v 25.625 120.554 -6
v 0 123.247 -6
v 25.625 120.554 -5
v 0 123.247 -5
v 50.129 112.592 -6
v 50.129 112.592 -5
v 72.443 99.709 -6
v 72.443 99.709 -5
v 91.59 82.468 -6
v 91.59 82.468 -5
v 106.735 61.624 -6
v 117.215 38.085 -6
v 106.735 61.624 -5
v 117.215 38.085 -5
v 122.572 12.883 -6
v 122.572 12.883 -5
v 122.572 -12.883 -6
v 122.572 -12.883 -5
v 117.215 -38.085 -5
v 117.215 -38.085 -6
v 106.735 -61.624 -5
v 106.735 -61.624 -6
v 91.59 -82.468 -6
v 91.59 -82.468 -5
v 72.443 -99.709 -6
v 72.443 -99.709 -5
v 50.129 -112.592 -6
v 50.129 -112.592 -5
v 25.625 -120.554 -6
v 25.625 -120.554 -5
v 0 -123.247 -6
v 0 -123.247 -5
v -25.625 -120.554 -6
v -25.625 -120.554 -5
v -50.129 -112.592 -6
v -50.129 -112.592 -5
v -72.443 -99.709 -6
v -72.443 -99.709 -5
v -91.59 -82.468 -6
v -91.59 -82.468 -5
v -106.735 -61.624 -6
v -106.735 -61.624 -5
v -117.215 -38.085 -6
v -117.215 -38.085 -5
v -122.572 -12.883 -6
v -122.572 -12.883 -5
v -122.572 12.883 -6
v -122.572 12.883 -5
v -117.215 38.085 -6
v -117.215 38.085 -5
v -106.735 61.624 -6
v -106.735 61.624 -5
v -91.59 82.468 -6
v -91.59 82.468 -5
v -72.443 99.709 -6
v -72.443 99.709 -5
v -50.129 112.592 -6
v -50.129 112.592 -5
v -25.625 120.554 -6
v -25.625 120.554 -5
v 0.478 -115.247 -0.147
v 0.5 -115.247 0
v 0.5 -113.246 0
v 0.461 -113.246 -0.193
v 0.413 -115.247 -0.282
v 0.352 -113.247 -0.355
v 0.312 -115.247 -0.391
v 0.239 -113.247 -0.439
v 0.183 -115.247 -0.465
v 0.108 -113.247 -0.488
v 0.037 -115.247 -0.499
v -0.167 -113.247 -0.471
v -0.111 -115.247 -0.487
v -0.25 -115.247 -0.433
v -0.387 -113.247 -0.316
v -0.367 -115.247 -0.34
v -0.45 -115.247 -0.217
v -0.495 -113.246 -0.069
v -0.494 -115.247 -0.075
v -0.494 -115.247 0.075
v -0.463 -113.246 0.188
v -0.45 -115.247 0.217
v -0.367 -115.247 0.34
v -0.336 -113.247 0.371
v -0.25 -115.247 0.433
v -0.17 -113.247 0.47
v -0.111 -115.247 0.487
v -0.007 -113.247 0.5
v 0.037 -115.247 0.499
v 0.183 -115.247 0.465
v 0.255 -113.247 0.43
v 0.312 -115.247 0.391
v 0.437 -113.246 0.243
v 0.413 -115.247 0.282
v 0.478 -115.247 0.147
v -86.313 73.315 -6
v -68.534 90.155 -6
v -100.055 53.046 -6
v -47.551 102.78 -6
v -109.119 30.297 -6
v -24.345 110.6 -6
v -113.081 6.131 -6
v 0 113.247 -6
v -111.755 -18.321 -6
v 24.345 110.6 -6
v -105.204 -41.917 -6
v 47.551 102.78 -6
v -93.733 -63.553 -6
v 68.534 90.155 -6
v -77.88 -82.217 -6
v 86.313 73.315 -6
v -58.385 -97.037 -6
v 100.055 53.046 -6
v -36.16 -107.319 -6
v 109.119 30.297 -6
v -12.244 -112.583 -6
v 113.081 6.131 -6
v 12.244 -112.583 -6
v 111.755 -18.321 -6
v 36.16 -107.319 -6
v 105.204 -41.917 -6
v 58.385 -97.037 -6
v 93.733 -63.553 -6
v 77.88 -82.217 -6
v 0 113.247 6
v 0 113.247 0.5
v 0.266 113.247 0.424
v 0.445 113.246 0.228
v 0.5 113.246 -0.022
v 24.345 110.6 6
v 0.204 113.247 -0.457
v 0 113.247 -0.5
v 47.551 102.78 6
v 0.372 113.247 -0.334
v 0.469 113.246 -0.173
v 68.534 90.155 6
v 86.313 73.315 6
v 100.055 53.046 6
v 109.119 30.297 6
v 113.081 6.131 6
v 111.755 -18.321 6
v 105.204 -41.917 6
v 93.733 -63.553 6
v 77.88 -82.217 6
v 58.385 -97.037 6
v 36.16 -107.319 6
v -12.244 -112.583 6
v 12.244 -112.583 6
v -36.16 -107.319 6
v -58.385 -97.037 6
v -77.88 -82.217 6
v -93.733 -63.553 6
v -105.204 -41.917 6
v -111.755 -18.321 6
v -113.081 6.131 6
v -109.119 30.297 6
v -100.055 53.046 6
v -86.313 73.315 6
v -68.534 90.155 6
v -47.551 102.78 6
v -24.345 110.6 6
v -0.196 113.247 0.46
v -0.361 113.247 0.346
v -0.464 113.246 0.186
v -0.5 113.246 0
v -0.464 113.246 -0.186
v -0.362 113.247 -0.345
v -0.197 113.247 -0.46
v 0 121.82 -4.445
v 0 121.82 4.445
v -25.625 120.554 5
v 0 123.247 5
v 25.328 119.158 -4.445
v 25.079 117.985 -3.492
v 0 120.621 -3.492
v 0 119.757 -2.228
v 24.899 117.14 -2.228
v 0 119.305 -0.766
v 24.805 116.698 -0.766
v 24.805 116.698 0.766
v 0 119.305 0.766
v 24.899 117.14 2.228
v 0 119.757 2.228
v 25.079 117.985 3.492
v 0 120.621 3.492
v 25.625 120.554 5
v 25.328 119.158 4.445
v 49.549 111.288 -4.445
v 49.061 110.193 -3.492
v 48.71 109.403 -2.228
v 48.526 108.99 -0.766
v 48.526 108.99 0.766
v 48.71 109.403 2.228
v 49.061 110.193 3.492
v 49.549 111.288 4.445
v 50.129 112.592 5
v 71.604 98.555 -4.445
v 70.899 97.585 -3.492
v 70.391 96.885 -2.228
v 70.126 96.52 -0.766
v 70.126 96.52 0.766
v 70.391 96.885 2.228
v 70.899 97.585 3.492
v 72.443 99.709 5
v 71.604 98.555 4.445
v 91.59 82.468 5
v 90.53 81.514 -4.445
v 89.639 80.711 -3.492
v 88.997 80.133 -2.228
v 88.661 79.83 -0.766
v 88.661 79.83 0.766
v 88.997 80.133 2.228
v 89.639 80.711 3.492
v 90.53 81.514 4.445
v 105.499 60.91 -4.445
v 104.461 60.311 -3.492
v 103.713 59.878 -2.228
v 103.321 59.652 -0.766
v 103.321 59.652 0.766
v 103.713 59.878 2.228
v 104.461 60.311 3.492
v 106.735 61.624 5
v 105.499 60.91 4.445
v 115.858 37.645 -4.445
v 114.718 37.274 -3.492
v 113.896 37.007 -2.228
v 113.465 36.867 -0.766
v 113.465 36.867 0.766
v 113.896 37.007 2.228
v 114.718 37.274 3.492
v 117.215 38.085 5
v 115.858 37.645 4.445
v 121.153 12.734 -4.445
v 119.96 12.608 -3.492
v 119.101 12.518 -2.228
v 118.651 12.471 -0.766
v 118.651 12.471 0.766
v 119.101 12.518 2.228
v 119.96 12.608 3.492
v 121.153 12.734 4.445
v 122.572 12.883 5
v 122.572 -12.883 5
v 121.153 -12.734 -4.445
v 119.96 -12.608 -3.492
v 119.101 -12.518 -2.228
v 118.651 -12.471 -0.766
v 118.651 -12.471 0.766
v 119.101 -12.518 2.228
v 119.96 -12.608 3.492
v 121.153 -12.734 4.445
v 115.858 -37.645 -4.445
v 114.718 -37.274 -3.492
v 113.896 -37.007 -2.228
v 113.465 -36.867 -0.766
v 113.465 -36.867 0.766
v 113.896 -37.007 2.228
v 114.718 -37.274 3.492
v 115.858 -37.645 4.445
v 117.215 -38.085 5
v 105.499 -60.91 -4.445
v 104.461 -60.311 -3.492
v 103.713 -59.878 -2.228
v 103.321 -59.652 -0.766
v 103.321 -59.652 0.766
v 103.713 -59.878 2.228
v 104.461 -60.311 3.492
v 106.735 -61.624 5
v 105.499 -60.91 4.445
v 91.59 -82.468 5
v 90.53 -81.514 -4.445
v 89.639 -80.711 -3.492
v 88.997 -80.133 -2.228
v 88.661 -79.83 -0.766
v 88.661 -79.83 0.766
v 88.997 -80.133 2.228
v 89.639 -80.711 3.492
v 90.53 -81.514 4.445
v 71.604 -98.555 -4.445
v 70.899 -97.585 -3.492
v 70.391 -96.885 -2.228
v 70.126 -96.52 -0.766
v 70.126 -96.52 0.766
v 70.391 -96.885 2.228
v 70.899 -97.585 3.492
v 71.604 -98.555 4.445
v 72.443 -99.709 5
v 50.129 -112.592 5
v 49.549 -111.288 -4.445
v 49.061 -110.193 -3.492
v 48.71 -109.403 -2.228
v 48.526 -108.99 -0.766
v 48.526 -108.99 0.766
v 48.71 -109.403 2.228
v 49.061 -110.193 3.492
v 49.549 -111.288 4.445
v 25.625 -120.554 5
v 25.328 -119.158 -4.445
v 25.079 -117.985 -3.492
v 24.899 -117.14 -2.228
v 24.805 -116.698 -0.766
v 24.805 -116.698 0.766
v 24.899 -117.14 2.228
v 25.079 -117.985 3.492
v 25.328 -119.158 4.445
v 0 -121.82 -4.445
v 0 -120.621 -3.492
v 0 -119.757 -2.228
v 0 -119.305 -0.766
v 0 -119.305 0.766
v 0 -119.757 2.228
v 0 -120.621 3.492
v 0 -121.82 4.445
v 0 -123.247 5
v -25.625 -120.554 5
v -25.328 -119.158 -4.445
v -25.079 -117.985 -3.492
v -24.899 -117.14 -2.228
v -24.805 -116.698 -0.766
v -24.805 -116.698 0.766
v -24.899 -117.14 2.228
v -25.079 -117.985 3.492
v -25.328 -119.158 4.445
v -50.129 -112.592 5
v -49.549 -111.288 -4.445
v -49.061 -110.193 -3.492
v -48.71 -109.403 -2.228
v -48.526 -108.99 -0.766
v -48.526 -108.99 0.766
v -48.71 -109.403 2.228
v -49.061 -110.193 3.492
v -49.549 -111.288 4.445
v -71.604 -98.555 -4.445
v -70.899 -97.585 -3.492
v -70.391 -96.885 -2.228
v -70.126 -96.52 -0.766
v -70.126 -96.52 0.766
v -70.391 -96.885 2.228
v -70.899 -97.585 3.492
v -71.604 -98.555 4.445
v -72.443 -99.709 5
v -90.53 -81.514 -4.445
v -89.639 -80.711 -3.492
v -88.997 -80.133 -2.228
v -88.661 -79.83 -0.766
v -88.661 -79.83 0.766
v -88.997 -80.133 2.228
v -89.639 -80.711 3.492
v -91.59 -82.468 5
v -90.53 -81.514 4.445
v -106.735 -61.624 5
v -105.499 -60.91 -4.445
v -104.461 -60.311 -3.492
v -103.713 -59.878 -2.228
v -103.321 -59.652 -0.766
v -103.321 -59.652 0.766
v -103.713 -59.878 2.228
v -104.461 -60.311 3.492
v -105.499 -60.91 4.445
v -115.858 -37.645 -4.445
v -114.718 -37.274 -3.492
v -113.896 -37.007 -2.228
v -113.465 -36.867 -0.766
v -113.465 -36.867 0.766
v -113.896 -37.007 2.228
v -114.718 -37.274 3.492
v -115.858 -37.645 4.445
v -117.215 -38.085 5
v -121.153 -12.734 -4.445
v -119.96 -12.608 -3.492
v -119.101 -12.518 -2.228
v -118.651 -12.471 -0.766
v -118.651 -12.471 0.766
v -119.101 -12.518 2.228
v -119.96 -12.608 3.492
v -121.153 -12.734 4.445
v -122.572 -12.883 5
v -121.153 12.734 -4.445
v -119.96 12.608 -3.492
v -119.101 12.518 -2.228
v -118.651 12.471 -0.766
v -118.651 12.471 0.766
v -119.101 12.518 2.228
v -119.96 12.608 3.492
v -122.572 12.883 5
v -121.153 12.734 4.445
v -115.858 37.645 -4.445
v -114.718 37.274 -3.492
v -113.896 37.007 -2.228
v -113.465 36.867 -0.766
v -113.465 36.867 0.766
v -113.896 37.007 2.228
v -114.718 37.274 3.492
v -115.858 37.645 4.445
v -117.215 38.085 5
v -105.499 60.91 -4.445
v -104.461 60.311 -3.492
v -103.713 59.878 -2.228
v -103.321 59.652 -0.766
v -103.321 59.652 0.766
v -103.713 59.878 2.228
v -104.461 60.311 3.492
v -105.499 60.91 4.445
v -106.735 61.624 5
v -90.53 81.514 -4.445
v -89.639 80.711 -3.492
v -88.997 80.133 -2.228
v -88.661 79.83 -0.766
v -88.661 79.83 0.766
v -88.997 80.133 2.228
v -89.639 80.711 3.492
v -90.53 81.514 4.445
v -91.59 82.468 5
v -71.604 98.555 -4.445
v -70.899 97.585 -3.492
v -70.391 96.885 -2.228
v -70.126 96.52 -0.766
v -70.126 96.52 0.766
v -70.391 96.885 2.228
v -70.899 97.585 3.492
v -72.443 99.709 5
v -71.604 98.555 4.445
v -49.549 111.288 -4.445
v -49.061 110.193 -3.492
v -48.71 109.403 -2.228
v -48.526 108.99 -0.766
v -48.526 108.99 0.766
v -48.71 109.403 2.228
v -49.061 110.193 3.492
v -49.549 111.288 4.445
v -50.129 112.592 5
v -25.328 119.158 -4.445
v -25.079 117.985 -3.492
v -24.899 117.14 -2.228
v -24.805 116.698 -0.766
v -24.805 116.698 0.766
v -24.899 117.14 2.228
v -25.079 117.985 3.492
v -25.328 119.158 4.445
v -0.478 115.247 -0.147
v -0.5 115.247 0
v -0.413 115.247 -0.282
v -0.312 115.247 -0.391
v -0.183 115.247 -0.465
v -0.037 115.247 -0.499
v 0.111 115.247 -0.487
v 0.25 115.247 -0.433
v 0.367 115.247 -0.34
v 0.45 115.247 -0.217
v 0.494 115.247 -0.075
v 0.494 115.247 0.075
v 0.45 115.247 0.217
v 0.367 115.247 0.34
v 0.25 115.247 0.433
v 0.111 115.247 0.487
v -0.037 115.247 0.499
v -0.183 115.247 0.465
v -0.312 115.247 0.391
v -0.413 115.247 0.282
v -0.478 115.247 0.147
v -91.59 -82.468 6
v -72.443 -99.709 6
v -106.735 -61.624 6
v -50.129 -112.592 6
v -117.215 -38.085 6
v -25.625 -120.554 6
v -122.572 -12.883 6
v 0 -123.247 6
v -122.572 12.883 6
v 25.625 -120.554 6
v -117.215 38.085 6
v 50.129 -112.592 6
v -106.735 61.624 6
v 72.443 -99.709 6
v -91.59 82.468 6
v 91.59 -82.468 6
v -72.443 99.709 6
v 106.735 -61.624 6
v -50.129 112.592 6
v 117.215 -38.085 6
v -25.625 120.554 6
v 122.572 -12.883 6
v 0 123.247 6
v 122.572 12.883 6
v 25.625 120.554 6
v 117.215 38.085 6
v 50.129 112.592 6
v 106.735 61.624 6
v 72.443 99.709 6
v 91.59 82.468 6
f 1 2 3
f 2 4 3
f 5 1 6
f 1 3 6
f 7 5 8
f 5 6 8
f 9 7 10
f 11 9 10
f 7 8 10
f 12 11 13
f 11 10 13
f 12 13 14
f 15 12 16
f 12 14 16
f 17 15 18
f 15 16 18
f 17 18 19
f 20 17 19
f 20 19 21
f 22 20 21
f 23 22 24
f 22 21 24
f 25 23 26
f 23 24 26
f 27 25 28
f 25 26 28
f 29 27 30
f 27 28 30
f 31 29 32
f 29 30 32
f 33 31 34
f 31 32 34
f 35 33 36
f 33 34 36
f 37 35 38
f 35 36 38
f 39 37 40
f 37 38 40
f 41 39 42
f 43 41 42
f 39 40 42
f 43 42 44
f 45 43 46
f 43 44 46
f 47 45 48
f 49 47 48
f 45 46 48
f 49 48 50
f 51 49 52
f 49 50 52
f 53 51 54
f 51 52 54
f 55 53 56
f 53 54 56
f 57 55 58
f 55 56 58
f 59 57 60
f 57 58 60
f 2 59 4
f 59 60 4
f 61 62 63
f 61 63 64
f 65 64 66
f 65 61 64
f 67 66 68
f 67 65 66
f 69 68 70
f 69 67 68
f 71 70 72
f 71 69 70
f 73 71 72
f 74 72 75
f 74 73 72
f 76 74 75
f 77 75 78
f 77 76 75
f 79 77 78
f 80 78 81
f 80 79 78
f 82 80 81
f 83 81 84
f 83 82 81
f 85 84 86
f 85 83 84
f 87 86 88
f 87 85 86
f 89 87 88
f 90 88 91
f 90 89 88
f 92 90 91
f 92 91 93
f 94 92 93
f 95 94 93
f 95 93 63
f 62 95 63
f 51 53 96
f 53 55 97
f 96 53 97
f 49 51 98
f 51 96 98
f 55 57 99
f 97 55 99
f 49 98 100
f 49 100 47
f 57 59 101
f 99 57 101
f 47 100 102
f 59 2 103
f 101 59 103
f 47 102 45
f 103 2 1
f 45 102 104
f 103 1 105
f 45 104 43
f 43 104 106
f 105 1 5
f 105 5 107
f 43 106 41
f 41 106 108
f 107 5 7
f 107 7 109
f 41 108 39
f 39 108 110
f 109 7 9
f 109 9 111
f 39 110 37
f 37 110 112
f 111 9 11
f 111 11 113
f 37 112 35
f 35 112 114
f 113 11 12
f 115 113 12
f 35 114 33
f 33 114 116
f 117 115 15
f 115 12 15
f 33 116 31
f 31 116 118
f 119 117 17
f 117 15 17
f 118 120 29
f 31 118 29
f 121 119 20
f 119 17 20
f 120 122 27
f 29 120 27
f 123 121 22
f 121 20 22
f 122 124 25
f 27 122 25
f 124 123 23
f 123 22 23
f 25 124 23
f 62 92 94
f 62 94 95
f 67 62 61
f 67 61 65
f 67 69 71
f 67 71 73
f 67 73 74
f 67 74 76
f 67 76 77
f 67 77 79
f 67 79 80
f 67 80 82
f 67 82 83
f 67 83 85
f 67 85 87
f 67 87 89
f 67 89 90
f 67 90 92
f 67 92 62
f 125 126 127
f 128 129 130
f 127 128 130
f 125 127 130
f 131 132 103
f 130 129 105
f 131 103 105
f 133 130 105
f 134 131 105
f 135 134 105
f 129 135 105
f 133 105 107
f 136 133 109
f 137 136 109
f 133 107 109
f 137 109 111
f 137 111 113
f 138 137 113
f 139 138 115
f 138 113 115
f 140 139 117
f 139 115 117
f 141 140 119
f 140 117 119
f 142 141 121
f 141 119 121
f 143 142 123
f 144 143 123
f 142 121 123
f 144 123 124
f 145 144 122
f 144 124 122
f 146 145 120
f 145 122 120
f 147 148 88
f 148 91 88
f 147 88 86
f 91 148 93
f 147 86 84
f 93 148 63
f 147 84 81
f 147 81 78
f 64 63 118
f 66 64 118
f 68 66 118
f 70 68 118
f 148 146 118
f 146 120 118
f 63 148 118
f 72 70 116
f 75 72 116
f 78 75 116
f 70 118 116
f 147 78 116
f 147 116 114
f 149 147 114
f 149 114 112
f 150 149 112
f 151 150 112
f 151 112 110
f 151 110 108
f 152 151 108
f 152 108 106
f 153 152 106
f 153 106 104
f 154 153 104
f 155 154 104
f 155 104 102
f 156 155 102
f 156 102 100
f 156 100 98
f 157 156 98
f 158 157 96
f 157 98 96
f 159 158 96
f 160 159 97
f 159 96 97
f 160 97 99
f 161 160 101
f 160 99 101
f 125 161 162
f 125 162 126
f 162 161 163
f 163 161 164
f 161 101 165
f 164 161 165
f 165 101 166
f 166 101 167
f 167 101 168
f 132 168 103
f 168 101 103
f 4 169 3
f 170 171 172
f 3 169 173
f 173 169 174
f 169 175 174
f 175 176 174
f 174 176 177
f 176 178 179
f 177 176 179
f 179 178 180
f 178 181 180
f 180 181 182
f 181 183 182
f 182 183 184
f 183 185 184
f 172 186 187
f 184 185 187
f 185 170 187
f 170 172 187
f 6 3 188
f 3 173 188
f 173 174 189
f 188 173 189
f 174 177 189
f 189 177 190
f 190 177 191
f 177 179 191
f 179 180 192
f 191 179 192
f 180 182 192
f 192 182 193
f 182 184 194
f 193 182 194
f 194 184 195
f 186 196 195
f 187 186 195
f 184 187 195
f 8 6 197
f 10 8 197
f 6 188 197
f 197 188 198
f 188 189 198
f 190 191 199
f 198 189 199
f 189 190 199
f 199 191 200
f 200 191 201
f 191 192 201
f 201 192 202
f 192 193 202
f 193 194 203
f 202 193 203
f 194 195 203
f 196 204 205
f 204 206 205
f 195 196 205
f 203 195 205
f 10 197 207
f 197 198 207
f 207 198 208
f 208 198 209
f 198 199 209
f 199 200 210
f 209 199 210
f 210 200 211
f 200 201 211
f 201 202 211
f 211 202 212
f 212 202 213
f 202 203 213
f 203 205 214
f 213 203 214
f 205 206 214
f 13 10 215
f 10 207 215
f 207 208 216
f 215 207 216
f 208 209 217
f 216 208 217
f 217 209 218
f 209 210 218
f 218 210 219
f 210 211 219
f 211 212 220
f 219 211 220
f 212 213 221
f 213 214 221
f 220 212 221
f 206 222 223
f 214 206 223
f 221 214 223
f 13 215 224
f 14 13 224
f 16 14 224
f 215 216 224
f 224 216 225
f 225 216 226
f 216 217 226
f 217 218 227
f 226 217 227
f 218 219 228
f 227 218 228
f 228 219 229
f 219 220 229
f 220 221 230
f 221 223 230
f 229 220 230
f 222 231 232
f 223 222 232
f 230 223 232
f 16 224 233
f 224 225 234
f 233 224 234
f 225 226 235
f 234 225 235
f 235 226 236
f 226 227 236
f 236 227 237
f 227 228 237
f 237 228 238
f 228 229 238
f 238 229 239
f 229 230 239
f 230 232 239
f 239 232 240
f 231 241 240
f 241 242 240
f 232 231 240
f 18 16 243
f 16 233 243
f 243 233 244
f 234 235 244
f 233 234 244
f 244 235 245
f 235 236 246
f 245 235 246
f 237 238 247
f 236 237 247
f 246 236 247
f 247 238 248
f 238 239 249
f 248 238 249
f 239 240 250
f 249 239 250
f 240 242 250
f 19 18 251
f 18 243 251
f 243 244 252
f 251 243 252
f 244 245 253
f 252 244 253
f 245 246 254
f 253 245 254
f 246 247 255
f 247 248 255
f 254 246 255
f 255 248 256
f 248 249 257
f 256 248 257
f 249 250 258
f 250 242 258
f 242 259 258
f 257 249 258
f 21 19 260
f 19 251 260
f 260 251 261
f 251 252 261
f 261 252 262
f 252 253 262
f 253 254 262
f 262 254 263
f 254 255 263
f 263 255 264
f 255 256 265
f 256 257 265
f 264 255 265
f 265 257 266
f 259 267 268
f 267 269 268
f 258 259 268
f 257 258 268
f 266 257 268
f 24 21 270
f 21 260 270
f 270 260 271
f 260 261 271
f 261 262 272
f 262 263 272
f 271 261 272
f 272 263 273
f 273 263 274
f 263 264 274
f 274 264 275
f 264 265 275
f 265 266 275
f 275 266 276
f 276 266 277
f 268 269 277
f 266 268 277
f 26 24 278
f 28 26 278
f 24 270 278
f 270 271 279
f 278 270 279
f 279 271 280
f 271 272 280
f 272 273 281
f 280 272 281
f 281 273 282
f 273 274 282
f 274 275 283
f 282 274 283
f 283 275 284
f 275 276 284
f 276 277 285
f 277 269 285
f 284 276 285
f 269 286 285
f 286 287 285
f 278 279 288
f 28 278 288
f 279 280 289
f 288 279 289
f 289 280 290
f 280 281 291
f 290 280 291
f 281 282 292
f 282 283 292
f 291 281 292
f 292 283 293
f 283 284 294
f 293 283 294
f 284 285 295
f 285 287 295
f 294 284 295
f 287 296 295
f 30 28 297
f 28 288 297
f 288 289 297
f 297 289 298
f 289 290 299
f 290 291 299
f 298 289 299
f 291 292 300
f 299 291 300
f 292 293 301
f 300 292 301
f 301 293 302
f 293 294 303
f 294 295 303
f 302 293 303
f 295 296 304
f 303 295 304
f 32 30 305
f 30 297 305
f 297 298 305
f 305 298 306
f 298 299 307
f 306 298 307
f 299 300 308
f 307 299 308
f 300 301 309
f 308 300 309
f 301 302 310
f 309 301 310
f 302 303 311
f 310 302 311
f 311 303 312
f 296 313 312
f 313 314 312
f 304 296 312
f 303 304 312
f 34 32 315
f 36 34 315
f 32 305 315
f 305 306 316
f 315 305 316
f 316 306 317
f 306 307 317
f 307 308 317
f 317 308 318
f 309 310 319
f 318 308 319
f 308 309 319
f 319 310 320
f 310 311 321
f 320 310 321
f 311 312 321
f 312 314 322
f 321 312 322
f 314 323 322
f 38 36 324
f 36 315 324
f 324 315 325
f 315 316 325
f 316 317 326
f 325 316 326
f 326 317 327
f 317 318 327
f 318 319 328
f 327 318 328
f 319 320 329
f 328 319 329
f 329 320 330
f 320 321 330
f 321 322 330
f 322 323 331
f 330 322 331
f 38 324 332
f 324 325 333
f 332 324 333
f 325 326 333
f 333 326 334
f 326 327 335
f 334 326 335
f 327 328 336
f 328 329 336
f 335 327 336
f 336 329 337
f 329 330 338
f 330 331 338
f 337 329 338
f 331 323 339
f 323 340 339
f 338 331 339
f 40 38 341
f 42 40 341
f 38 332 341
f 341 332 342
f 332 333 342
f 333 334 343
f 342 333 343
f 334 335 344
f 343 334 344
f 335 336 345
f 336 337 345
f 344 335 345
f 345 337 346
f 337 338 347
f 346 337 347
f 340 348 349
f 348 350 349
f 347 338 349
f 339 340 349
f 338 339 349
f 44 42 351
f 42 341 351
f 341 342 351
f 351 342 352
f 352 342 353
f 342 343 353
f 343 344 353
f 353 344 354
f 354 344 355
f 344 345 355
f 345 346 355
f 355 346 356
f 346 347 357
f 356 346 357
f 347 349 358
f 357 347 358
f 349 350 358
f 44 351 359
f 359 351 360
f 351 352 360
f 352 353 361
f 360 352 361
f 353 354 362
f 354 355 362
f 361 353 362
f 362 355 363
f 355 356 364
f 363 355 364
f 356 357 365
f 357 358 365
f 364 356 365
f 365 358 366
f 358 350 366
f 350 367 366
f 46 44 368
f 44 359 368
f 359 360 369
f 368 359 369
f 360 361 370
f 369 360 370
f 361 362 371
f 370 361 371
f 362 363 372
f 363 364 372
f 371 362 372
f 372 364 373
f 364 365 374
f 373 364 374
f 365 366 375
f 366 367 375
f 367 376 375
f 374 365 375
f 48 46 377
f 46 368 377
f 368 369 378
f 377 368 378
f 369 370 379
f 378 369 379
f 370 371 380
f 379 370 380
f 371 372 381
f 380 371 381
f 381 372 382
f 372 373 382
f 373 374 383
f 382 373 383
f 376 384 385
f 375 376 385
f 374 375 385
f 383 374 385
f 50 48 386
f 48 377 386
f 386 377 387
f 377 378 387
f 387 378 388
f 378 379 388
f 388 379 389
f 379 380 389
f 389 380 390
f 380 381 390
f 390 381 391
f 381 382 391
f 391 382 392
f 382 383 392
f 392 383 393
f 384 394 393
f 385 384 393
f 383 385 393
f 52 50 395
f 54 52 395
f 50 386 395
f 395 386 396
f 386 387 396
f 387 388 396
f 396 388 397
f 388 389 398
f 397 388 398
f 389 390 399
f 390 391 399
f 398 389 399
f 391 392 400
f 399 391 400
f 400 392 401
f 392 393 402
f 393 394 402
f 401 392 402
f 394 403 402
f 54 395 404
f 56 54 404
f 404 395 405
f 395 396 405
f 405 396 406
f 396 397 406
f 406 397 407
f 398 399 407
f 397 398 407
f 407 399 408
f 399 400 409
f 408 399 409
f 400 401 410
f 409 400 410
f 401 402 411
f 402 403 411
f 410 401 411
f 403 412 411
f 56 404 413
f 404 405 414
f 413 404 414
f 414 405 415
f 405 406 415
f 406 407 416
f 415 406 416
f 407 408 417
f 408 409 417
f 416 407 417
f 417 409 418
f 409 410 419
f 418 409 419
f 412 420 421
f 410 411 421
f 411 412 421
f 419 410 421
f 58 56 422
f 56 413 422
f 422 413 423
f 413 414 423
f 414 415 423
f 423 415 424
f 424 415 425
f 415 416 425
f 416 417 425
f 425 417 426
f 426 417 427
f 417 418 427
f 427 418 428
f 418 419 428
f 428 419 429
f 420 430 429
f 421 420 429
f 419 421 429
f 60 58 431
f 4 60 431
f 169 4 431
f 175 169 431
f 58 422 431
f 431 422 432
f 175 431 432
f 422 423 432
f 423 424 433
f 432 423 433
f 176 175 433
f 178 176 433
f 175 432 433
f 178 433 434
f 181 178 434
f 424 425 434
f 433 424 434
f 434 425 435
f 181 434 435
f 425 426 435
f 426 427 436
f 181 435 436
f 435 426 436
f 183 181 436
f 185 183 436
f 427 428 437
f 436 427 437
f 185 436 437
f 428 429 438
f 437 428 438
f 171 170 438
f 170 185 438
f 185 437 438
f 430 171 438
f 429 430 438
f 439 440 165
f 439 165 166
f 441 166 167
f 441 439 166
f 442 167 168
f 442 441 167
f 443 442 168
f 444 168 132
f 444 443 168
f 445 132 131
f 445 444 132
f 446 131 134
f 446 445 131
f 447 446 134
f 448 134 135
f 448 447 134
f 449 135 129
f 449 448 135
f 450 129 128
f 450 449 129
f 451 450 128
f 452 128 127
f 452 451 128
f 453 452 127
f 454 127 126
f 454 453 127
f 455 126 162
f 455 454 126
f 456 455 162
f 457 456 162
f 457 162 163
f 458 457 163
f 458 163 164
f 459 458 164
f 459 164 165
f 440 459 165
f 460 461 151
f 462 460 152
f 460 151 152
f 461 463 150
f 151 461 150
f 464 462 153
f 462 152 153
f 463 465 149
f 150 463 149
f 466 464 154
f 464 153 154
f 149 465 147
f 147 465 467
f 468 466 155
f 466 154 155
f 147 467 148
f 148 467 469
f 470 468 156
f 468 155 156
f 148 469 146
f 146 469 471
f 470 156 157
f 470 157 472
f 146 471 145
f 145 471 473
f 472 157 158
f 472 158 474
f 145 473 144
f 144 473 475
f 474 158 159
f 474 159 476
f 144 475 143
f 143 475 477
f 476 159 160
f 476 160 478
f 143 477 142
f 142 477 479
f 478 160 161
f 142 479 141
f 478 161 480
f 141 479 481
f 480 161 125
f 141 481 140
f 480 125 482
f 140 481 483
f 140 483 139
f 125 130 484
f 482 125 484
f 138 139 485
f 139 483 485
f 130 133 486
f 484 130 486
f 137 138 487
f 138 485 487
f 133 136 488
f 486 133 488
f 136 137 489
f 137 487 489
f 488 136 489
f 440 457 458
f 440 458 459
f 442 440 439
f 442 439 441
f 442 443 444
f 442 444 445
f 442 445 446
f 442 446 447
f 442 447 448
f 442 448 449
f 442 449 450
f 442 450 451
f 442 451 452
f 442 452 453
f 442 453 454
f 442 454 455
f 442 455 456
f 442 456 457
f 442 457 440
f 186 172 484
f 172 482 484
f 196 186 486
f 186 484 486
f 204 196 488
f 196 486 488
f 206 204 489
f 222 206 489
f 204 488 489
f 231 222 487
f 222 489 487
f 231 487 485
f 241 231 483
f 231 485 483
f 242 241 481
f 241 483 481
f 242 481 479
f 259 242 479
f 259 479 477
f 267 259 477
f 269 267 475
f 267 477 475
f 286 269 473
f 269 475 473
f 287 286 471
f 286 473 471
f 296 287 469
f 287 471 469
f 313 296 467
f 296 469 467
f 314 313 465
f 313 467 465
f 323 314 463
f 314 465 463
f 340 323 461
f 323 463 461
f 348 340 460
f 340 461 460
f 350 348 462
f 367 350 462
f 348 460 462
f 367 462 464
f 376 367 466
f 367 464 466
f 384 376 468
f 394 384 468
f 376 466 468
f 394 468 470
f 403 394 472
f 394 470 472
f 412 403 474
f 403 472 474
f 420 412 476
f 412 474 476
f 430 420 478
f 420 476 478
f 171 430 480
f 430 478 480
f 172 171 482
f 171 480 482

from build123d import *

# Parameters (mm, degrees)
SKETCH3_R          = 0.5
CUT_EXTRUDE1_DEPTH = 29
SKETCH4_R          = 0.5
CUT_EXTRUDE2_DEPTH = 11


with BuildPart() as part:
    # Sketch1 → Revolve1 (revolve)
    with BuildSketch(Plane(origin=(0, 0, 0), x_dir=(0, 0, -1), z_dir=(1, 0, 0))):
        with BuildLine():
            Line((0.5, 113.24716621), (6, 113.24716621))
            Line((6, 113.24716621), (6, 123.24716621))
            Line((6, 123.24716621), (5, 123.24716621))
            ThreePointArc((5, 123.24716621), (0, 119.24716621), (-5, 123.24716621))
            Line((-5, 123.24716621), (-6, 123.24716621))
            Line((-6, 123.24716621), (-6, 113.24716621))
            Line((-6, 113.24716621), (-0.5, 113.24716621))
            Line((-0.5, 113.24716621), (0.5, 113.24716621))
        make_face()
    revolve(axis=Axis((0, 0, 80.785821763), (0, 0, -1)))

    # Sketch3 → Cut-Extrude1 (cut)
    with BuildSketch(Plane(origin=(0, 115.24716621, 0), x_dir=(-1, 0, 0), z_dir=(0, -1, 0))):
        Circle(SKETCH3_R)
    extrude(amount=CUT_EXTRUDE1_DEPTH, mode=Mode.SUBTRACT)

    # Sketch4 → Cut-Extrude2 (cut)
    with BuildSketch(Plane(origin=(0, -115.24716621, 0), x_dir=(1, 0, 0), z_dir=(0, 1, 0))):
        Circle(SKETCH4_R)
    extrude(amount=CUT_EXTRUDE2_DEPTH, mode=Mode.SUBTRACT)


solid = part.part
